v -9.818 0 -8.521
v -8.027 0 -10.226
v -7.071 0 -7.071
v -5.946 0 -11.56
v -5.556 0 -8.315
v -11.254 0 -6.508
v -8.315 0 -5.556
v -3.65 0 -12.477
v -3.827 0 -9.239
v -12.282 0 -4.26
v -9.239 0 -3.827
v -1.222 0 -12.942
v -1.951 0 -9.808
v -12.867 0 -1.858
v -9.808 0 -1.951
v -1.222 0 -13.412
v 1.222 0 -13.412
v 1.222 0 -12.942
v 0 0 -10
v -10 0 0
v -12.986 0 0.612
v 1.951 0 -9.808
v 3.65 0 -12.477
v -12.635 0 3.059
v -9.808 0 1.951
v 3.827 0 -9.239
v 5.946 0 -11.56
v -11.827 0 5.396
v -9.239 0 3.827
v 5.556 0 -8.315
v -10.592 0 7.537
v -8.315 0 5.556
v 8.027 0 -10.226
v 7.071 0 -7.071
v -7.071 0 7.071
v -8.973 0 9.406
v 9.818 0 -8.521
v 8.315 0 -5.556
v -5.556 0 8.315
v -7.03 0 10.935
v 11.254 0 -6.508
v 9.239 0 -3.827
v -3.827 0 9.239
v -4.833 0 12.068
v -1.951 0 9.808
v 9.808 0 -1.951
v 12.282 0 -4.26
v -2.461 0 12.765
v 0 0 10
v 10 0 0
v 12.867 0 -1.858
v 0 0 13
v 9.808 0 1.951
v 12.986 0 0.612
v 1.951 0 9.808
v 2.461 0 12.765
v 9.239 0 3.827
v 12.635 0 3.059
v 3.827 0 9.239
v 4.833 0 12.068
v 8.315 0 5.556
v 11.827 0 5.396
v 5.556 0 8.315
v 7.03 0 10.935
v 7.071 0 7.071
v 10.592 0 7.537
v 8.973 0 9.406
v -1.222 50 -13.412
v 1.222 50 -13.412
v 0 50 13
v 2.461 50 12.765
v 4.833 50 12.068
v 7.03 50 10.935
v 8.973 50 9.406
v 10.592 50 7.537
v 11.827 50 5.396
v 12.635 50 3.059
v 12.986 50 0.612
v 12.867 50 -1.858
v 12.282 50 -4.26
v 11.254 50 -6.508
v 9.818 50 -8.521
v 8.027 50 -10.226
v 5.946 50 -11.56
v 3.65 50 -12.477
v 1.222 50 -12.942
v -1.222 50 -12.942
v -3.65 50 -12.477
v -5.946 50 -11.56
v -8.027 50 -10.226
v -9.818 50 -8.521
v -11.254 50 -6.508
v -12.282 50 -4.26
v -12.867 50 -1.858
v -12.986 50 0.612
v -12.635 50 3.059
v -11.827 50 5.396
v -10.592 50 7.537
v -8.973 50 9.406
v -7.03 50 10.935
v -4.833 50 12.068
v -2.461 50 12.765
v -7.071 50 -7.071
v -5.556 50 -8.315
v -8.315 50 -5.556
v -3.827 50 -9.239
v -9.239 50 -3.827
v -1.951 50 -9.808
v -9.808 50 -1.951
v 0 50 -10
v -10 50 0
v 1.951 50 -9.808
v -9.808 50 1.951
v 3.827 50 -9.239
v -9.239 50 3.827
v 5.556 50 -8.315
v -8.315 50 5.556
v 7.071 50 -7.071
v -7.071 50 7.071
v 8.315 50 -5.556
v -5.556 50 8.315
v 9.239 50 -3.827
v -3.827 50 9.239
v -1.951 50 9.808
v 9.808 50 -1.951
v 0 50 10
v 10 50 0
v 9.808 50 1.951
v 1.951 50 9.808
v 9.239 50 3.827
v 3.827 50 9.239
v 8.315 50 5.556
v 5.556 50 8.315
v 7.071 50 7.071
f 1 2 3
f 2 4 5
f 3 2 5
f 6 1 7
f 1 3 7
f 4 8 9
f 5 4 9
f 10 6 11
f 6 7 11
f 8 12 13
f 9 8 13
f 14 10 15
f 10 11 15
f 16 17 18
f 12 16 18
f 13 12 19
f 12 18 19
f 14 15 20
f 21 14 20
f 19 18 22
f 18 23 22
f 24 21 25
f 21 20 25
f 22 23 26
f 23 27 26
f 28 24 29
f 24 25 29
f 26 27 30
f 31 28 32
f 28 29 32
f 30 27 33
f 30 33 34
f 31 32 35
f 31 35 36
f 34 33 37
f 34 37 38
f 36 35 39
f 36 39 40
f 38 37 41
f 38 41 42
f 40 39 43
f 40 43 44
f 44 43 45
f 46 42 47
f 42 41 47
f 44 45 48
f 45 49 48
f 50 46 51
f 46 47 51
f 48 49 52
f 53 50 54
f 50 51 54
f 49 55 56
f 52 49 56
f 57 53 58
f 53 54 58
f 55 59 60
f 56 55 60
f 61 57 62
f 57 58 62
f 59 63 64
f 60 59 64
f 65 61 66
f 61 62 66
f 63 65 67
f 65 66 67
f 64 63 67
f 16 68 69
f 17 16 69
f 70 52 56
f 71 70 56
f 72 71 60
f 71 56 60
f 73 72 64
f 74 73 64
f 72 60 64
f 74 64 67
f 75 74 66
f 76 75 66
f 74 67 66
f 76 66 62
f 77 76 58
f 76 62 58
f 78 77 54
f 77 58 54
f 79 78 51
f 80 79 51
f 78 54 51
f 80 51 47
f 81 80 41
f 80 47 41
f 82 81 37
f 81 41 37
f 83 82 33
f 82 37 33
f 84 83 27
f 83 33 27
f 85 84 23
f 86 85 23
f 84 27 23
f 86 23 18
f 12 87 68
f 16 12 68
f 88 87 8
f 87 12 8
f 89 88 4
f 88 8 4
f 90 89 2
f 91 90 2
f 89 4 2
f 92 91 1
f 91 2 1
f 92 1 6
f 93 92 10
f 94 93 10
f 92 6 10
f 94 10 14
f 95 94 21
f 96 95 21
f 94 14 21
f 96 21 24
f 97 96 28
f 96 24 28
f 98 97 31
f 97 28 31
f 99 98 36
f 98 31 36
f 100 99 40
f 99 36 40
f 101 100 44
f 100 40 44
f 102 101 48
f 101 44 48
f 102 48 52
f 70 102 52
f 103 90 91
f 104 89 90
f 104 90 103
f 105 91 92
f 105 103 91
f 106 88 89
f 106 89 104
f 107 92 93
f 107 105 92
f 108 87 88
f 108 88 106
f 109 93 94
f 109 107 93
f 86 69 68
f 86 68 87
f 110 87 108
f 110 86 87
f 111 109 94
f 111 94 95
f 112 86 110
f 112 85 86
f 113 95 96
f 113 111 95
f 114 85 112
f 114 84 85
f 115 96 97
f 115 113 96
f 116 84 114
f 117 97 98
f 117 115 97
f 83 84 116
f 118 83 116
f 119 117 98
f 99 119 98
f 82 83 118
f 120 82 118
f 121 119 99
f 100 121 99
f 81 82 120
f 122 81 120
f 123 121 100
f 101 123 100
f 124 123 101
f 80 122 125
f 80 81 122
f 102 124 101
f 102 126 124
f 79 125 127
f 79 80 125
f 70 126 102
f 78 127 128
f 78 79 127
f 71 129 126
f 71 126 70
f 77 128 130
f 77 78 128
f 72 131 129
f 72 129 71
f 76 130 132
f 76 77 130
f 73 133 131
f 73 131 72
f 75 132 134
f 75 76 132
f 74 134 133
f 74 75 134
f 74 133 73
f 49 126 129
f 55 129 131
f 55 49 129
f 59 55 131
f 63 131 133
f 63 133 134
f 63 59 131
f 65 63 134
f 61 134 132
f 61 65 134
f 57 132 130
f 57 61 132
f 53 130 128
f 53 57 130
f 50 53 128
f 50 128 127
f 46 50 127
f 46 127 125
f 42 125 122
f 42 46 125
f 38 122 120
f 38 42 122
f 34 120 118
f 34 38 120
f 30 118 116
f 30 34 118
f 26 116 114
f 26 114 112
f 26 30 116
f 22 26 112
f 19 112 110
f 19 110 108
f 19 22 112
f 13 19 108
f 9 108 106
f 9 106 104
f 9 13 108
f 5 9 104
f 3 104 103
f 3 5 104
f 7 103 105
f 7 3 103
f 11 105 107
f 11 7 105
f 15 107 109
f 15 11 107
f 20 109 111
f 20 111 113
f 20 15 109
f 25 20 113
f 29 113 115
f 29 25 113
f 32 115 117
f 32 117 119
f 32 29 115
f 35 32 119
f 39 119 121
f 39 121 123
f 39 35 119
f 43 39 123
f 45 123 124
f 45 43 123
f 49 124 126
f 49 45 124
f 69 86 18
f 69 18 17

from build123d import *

# Parameters (mm, degrees)
CROQUIS1_R              = 13
CROQUIS1_R_2            = 10
SALIENTE_EXTRUIR1_DEPTH = 50
CROQUIS2_W              = 2.444322312
CROQUIS2_H              = 0.823480184
SALIENTE_EXTRUIR2_DEPTH = 50


with BuildPart() as part:
    # Croquis1 → Saliente-Extruir1 (new body)
    with BuildSketch(Plane(origin=(0, 0, 0), x_dir=(1, 0, 0), z_dir=(0, 1, 0))):
        with Locations(Location((0, 0, 0), (0, 0, 270))):
            Circle(CROQUIS1_R)
        with Locations(Location((0, 0, 0), (0, 0, 270))):
            Circle(CROQUIS1_R_2, mode=Mode.SUBTRACT)
    extrude(amount=SALIENTE_EXTRUIR1_DEPTH)

    # Croquis2 → Saliente-Extruir2 (add)
    with BuildSketch(Plane(origin=(0, 50, 0), x_dir=(1, 0, 0), z_dir=(0, 1, 0))):
        with Locations((0, 13)):
            Rectangle(CROQUIS2_W, CROQUIS2_H)
    extrude(amount=-SALIENTE_EXTRUIR2_DEPTH)


solid = part.part
